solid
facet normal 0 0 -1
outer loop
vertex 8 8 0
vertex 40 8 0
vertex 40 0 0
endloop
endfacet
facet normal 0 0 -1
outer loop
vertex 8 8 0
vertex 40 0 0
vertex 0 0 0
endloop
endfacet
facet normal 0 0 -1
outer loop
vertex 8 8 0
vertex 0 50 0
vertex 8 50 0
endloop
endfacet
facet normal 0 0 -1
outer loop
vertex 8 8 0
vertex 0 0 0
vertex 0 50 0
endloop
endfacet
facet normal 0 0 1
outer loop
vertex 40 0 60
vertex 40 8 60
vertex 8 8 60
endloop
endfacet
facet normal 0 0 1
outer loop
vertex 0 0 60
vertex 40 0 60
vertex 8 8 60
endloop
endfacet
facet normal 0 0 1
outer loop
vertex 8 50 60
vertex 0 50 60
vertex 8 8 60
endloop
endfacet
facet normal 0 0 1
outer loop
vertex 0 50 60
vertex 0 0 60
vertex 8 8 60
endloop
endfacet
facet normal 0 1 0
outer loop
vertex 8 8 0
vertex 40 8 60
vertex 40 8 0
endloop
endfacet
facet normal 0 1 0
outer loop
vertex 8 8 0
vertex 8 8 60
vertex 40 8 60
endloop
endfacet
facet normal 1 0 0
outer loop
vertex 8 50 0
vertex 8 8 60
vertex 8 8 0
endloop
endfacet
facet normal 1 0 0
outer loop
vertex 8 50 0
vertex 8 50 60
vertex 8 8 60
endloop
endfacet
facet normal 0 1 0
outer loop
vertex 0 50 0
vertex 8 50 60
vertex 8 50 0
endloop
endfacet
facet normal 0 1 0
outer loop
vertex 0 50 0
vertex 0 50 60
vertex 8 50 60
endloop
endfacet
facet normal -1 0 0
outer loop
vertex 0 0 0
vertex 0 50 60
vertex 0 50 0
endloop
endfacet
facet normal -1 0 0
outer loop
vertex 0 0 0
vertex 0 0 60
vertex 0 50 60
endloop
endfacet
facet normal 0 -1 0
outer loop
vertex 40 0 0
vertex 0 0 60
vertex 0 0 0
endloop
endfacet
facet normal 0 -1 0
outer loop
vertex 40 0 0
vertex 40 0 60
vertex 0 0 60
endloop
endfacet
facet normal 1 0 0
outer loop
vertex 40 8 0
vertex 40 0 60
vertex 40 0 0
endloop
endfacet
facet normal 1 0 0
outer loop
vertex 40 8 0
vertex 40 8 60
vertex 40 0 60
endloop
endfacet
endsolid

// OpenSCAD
$fn = 32;

// ----------------------------------------------------------------------
// Structural section: angle 40 x 50 mm
// ----------------------------------------------------------------------

// --- parameters (mm) ---
sec_w = 40;               // leg width, X
sec_h = 50;               // leg height, Y
flange_t = 8;             // leg thickness
plate_t = 60;             // cut length, Z (extrusion height)

profile = [[0, 0], [40, 0], [40, 8], [8, 8], [8, 50], [0, 50]];  // primary outline, 6 points, counter clockwise

// --- the one profile operation ---
linear_extrude(height = plate_t) polygon(points = profile);
